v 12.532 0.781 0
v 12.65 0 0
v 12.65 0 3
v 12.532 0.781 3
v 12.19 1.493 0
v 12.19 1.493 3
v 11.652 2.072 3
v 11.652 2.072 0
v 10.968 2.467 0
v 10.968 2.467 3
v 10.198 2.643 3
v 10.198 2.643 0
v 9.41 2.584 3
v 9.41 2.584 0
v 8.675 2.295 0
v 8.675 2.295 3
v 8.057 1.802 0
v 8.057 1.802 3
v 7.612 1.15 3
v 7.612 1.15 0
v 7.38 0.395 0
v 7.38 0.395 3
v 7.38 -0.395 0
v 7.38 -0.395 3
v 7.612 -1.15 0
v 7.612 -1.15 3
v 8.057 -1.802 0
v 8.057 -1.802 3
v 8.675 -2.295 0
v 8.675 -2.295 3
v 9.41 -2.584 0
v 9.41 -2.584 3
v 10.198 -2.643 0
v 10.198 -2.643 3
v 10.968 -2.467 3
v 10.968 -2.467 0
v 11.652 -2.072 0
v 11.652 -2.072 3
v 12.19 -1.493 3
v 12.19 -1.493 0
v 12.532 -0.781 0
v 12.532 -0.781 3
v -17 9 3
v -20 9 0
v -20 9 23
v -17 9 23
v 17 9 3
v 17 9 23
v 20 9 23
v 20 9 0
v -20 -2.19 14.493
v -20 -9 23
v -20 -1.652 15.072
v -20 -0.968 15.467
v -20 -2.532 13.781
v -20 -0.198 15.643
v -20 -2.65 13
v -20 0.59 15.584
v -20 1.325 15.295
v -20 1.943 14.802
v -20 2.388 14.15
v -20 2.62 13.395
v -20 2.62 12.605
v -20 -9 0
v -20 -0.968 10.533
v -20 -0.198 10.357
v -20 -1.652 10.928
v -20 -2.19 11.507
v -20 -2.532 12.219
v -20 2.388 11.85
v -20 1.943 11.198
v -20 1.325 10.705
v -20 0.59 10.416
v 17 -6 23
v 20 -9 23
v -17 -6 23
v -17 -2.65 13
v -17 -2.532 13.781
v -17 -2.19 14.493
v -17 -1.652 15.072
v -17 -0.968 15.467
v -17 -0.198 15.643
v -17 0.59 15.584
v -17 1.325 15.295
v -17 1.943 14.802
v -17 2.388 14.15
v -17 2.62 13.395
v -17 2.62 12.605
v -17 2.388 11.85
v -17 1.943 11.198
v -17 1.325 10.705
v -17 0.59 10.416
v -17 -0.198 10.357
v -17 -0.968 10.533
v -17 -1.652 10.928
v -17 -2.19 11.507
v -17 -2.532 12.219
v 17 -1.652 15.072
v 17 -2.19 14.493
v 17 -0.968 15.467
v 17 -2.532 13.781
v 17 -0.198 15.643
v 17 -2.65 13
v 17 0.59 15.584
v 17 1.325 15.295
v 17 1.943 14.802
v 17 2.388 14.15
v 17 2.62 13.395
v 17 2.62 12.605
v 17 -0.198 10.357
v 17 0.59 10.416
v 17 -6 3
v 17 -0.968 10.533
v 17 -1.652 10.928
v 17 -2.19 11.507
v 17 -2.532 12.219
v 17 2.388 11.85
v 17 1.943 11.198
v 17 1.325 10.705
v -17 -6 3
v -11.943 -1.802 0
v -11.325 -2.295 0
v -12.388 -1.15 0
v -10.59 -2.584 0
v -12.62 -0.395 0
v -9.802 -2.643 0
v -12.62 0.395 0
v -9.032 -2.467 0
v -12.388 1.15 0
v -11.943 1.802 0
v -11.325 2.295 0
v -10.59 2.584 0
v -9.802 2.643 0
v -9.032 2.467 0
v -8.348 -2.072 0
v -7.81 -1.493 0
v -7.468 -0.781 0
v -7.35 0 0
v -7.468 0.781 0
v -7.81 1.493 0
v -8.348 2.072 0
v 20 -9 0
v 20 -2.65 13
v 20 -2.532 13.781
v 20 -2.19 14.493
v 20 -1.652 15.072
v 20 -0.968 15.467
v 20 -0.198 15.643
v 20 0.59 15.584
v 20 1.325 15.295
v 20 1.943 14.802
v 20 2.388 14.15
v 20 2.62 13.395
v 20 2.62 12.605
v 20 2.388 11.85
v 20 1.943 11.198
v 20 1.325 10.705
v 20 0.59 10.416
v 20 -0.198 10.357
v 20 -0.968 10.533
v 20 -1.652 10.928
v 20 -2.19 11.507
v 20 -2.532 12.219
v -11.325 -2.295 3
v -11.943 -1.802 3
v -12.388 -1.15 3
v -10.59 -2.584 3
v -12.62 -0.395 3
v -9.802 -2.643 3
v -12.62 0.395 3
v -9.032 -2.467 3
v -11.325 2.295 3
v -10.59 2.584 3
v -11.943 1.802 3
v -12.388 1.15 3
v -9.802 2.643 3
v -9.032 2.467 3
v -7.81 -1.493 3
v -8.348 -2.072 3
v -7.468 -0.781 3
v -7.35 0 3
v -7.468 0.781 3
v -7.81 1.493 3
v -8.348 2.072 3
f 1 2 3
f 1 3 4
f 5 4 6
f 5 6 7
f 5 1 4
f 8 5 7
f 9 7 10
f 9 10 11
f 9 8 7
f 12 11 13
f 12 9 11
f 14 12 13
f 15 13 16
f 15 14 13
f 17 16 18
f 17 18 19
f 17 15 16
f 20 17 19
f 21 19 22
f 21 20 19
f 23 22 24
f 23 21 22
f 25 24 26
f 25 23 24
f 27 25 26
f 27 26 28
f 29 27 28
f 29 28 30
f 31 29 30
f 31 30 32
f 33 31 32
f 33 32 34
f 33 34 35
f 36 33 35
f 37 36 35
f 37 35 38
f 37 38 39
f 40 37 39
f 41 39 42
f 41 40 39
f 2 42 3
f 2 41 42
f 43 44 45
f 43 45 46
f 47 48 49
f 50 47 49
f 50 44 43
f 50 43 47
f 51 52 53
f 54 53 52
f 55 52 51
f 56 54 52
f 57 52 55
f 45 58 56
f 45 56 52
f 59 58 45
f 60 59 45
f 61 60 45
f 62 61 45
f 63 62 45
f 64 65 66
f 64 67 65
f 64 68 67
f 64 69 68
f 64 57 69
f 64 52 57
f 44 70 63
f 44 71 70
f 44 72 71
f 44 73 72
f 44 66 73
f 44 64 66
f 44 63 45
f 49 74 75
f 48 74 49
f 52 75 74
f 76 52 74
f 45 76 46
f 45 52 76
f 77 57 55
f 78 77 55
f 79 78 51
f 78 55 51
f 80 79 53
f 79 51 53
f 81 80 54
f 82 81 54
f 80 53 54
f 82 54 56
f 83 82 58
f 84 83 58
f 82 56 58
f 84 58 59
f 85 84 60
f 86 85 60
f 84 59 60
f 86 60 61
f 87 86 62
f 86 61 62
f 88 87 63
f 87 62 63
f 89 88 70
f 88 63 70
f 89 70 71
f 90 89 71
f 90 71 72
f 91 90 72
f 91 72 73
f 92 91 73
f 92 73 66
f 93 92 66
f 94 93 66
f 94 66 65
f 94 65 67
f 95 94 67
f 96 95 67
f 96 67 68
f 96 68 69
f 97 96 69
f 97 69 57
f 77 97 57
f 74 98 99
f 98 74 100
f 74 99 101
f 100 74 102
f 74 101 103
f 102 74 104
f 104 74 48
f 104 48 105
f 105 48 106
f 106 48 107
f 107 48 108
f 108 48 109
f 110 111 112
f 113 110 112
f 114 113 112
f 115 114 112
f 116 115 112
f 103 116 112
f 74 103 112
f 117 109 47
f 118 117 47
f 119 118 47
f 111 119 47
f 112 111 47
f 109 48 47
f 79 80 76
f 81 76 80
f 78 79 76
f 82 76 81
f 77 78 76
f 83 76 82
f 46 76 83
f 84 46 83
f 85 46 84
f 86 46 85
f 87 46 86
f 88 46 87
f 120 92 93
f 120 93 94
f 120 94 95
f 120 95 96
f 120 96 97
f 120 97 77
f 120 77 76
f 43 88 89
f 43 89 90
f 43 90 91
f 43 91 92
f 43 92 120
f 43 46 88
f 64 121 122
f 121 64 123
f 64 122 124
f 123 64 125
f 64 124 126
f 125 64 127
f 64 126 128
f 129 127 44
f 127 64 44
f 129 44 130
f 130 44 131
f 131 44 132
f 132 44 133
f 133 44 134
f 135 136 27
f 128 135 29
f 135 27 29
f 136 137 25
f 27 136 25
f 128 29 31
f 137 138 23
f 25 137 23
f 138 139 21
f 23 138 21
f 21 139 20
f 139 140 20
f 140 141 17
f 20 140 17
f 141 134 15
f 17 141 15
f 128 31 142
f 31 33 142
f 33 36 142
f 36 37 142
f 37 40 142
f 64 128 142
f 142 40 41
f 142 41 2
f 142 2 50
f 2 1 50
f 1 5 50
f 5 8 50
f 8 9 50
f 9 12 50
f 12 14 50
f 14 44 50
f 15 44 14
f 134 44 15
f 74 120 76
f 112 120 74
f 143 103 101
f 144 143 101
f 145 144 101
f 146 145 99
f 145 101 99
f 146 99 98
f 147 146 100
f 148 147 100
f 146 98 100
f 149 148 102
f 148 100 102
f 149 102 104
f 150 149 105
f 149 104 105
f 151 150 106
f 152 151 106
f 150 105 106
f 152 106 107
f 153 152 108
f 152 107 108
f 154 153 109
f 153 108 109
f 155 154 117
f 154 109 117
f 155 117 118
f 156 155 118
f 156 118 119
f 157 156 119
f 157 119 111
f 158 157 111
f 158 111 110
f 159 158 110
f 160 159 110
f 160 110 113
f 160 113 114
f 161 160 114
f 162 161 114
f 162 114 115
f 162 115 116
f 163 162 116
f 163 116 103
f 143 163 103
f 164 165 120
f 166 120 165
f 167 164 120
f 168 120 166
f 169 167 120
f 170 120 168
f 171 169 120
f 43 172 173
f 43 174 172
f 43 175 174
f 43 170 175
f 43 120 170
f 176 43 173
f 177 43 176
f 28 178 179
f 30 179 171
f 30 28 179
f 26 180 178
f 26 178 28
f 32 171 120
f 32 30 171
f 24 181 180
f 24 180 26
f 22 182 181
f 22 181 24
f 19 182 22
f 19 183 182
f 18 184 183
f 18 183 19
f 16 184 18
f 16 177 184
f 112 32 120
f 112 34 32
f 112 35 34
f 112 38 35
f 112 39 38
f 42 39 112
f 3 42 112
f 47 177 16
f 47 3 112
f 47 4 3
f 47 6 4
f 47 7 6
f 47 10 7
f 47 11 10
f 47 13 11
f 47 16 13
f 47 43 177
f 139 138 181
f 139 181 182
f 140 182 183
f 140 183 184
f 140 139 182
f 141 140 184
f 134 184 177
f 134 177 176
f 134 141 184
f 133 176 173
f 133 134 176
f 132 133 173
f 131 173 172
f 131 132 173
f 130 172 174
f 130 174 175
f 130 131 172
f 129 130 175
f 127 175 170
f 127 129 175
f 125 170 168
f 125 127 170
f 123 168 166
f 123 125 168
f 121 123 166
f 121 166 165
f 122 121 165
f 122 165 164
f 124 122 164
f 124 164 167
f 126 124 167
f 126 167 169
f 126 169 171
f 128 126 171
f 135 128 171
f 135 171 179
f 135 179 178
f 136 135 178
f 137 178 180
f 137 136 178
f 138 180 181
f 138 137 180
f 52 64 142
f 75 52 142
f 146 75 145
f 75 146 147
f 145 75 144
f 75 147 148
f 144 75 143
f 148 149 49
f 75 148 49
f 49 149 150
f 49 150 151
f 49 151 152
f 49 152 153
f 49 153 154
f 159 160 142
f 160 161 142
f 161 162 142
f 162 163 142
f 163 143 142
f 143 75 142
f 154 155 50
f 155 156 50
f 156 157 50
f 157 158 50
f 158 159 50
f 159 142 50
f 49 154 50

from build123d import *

# Parameters (mm, degrees)
SKETCH_1_W          = 40
SKETCH_1_H          = 18
SKETCH_1_R          = 2.65
EXTRUDE_1_DEPTH     = 3
SKETCH_3_W          = 20
SKETCH_3_H          = 18
SKETCH_3_R          = 2.65
EXTRUDE_2_DEPTH     = 40
SKETCH_5_W          = 34
SKETCH_5_H          = 20
CUT_EXTRUDE_2_DEPTH = 15


with BuildPart() as part:
    # 草图1 → 凸台-拉伸1 (new body)
    with BuildSketch(Plane.XY):
        Rectangle(SKETCH_1_W, SKETCH_1_H)
        with Locations((-10, 0)):
            Circle(SKETCH_1_R, mode=Mode.SUBTRACT)
        with Locations((10, 0)):
            Circle(SKETCH_1_R, mode=Mode.SUBTRACT)
    extrude(amount=EXTRUDE_1_DEPTH)

    # 草图3 → 凸台-拉伸2 (add)
    with BuildSketch(Plane.ZY.offset(20)):
        with Locations((13, 0)):
            Rectangle(SKETCH_3_W, SKETCH_3_H)
        with Locations(Location((13, 0, 0), (0, 0, 270))):
            Circle(SKETCH_3_R, mode=Mode.SUBTRACT)
    extrude(amount=-EXTRUDE_2_DEPTH)

    # 草图5 → 切除-拉伸2 (cut)
    with BuildSketch(Plane(origin=(0, 9, 0), x_dir=(1, 0, 0), z_dir=(0, 1, 0))):
        with Locations((0, -13)):
            Rectangle(SKETCH_5_W, SKETCH_5_H)
    extrude(amount=-CUT_EXTRUDE_2_DEPTH, mode=Mode.SUBTRACT)


solid = part.part
